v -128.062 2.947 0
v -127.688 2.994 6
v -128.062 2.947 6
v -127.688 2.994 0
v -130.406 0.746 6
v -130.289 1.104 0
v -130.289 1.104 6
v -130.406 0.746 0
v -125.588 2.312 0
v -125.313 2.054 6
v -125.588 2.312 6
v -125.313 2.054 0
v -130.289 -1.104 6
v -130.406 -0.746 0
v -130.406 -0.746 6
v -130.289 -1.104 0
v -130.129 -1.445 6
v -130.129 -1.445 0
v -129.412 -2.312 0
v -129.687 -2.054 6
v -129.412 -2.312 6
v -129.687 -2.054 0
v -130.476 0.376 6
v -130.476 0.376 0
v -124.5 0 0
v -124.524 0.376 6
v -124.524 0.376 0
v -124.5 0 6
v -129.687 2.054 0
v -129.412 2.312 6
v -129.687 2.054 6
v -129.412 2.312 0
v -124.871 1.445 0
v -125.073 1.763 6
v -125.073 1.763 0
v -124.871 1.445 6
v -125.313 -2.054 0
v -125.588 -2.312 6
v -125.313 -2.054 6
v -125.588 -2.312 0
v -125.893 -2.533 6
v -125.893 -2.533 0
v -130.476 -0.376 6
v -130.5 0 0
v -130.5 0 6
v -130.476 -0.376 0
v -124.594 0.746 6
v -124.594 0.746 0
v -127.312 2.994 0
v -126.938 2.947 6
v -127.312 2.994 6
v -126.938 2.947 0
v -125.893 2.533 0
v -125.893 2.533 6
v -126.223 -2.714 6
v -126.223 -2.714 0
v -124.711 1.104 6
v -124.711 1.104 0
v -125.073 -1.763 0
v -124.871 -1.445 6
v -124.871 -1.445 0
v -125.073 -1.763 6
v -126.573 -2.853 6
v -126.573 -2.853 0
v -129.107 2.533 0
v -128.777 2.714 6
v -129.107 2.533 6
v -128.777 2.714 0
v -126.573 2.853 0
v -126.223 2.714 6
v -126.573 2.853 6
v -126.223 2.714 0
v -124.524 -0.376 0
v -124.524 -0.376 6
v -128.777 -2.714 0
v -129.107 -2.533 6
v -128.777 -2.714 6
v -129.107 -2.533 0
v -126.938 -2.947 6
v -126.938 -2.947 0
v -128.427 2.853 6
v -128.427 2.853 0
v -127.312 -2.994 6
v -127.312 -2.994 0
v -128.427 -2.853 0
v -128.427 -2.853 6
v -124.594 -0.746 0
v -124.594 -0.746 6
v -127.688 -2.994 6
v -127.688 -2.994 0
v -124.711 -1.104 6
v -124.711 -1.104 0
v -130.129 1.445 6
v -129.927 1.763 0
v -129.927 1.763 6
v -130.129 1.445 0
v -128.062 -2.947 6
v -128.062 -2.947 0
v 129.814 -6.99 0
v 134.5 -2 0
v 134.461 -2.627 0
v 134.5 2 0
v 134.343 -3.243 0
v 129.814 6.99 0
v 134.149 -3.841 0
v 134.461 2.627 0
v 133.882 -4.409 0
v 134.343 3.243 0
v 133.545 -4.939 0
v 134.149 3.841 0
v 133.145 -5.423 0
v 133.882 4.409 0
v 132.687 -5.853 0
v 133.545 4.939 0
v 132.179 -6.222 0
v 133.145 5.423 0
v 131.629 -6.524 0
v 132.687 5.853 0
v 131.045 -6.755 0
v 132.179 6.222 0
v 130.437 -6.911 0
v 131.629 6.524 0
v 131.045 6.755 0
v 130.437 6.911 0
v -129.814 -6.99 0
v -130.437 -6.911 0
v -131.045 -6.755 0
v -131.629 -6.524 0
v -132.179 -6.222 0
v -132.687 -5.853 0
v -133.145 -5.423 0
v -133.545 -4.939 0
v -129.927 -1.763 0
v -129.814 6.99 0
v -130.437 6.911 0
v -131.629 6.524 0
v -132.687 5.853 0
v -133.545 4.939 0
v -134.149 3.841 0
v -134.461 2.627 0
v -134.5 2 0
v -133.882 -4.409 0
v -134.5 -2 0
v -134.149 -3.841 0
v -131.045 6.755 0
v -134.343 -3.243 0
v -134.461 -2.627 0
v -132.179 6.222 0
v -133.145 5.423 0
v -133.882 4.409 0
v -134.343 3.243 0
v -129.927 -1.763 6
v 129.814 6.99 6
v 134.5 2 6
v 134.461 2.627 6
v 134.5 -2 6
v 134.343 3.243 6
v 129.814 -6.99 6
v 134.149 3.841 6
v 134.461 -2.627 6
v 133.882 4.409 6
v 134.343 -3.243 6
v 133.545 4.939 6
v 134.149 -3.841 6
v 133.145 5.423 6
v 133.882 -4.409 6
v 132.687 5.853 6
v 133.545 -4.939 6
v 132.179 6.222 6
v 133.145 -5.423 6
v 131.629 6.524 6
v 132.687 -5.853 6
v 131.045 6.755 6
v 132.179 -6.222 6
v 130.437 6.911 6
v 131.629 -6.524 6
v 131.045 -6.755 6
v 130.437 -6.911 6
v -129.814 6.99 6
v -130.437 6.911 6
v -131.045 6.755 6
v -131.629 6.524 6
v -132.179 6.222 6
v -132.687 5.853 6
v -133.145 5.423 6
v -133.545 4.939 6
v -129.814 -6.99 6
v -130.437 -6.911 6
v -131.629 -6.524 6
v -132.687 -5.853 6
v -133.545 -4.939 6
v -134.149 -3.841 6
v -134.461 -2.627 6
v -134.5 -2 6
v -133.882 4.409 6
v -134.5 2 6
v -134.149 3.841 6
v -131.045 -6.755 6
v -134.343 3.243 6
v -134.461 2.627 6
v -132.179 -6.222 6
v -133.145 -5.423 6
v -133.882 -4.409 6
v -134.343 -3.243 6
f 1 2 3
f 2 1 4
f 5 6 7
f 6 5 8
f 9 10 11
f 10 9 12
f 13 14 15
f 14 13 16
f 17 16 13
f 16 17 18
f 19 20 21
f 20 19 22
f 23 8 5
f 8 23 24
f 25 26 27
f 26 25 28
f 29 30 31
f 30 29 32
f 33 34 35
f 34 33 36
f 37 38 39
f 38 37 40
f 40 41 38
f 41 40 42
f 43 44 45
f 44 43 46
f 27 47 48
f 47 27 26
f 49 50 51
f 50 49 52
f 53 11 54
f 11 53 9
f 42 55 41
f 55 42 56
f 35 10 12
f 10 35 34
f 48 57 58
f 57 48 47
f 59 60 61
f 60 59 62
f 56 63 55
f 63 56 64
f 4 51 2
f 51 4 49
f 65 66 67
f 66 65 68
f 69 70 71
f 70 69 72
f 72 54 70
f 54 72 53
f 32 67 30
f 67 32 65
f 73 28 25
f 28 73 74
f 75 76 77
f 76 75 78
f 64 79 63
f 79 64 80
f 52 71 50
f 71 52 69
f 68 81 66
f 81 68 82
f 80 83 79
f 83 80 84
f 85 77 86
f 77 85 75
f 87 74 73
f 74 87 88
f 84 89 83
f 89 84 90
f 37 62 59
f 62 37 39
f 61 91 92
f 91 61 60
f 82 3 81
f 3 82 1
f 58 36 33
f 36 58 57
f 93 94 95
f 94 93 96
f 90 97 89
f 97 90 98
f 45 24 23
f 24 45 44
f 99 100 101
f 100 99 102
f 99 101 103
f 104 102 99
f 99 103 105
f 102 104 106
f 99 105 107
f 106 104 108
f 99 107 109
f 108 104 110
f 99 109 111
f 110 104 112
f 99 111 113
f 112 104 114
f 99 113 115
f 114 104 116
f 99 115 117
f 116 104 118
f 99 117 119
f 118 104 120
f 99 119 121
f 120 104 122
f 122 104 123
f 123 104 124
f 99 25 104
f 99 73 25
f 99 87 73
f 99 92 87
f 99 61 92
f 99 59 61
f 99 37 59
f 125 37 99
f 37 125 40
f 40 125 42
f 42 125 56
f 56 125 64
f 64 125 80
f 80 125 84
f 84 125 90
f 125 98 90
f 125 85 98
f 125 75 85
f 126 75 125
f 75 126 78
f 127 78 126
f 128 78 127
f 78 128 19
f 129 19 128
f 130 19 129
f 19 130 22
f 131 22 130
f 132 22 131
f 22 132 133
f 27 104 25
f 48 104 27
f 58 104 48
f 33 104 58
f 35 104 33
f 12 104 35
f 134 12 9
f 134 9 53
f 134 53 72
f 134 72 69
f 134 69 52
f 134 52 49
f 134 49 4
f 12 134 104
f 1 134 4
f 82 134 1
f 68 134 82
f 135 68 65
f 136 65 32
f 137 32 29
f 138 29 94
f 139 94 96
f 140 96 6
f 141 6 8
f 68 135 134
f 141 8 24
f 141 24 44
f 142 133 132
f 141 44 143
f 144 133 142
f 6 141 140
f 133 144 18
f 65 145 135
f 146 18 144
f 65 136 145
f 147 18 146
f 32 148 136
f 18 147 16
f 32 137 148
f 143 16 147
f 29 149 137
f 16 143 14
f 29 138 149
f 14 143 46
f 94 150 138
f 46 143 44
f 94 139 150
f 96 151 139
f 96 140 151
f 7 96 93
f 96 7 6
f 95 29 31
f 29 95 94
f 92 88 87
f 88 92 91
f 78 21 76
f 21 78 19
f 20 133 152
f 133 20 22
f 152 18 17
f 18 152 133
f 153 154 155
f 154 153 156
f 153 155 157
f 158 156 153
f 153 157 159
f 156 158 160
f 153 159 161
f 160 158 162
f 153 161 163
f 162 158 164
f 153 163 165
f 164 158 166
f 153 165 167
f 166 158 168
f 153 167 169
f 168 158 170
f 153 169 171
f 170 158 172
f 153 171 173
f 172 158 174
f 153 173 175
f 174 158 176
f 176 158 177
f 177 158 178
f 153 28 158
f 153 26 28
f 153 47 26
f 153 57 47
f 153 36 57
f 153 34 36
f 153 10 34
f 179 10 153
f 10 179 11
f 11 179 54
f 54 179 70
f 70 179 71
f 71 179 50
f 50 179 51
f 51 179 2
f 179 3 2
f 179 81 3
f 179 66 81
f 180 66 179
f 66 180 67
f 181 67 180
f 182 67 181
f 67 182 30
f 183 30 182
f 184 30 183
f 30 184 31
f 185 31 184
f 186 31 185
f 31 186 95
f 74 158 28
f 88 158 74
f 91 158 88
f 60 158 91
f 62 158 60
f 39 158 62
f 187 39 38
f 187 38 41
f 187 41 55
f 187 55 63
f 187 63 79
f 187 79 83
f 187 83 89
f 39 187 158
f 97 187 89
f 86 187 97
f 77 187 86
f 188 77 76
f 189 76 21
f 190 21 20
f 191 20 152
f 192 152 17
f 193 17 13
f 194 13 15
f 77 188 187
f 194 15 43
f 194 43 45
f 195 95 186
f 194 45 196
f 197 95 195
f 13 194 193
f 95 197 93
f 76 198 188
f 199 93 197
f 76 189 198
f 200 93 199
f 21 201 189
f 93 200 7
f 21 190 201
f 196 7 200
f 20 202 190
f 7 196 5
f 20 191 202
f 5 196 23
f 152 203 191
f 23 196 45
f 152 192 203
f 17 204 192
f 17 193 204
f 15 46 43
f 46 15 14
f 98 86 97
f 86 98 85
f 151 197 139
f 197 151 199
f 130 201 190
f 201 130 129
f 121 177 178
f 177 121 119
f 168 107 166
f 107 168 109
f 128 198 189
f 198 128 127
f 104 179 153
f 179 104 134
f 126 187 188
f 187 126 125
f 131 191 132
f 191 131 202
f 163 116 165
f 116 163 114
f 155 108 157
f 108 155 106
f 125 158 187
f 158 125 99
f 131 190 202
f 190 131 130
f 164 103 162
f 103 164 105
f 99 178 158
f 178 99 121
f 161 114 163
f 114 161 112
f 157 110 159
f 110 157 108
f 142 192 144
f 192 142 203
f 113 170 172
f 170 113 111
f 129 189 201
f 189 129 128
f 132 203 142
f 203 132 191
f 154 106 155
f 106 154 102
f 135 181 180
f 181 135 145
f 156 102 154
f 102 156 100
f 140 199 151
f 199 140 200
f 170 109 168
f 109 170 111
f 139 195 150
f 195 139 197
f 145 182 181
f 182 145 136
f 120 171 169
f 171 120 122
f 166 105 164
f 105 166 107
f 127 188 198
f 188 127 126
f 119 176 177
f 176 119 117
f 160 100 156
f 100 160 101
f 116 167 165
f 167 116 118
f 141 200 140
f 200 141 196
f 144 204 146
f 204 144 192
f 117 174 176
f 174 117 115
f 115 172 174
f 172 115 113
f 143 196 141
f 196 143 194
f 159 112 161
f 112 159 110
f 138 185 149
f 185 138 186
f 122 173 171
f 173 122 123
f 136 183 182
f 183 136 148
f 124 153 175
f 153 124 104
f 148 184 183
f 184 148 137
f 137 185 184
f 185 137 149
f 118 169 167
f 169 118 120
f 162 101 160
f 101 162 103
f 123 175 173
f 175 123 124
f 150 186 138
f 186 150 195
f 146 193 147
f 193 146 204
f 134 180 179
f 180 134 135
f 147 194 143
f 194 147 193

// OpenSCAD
$fn = 50;


difference() {
	union() {
		hull() {
			translate(v = [-129.5000000000, 2.0000000000, 0]) {
				cylinder(h = 6, r = 5);
			}
			translate(v = [129.5000000000, 2.0000000000, 0]) {
				cylinder(h = 6, r = 5);
			}
			translate(v = [-129.5000000000, -2.0000000000, 0]) {
				cylinder(h = 6, r = 5);
			}
			translate(v = [129.5000000000, -2.0000000000, 0]) {
				cylinder(h = 6, r = 5);
			}
		}
	}
	union() {
		translate(v = [-127.5000000000, 0.0000000000, 0]) {
			cylinder(h = 6, r = 3.0000000000);
		}
		translate(v = [-127.5000000000, 0.0000000000, 0]) {
			cylinder(h = 6, r = 1.5000000000);
		}
		translate(v = [-127.5000000000, 0.0000000000, 0]) {
			cylinder(h = 6, r = 1.5000000000);
		}
		translate(v = [-127.5000000000, 0.0000000000, 0]) {
			cylinder(h = 6, r = 1.5000000000);
		}
	}
}
